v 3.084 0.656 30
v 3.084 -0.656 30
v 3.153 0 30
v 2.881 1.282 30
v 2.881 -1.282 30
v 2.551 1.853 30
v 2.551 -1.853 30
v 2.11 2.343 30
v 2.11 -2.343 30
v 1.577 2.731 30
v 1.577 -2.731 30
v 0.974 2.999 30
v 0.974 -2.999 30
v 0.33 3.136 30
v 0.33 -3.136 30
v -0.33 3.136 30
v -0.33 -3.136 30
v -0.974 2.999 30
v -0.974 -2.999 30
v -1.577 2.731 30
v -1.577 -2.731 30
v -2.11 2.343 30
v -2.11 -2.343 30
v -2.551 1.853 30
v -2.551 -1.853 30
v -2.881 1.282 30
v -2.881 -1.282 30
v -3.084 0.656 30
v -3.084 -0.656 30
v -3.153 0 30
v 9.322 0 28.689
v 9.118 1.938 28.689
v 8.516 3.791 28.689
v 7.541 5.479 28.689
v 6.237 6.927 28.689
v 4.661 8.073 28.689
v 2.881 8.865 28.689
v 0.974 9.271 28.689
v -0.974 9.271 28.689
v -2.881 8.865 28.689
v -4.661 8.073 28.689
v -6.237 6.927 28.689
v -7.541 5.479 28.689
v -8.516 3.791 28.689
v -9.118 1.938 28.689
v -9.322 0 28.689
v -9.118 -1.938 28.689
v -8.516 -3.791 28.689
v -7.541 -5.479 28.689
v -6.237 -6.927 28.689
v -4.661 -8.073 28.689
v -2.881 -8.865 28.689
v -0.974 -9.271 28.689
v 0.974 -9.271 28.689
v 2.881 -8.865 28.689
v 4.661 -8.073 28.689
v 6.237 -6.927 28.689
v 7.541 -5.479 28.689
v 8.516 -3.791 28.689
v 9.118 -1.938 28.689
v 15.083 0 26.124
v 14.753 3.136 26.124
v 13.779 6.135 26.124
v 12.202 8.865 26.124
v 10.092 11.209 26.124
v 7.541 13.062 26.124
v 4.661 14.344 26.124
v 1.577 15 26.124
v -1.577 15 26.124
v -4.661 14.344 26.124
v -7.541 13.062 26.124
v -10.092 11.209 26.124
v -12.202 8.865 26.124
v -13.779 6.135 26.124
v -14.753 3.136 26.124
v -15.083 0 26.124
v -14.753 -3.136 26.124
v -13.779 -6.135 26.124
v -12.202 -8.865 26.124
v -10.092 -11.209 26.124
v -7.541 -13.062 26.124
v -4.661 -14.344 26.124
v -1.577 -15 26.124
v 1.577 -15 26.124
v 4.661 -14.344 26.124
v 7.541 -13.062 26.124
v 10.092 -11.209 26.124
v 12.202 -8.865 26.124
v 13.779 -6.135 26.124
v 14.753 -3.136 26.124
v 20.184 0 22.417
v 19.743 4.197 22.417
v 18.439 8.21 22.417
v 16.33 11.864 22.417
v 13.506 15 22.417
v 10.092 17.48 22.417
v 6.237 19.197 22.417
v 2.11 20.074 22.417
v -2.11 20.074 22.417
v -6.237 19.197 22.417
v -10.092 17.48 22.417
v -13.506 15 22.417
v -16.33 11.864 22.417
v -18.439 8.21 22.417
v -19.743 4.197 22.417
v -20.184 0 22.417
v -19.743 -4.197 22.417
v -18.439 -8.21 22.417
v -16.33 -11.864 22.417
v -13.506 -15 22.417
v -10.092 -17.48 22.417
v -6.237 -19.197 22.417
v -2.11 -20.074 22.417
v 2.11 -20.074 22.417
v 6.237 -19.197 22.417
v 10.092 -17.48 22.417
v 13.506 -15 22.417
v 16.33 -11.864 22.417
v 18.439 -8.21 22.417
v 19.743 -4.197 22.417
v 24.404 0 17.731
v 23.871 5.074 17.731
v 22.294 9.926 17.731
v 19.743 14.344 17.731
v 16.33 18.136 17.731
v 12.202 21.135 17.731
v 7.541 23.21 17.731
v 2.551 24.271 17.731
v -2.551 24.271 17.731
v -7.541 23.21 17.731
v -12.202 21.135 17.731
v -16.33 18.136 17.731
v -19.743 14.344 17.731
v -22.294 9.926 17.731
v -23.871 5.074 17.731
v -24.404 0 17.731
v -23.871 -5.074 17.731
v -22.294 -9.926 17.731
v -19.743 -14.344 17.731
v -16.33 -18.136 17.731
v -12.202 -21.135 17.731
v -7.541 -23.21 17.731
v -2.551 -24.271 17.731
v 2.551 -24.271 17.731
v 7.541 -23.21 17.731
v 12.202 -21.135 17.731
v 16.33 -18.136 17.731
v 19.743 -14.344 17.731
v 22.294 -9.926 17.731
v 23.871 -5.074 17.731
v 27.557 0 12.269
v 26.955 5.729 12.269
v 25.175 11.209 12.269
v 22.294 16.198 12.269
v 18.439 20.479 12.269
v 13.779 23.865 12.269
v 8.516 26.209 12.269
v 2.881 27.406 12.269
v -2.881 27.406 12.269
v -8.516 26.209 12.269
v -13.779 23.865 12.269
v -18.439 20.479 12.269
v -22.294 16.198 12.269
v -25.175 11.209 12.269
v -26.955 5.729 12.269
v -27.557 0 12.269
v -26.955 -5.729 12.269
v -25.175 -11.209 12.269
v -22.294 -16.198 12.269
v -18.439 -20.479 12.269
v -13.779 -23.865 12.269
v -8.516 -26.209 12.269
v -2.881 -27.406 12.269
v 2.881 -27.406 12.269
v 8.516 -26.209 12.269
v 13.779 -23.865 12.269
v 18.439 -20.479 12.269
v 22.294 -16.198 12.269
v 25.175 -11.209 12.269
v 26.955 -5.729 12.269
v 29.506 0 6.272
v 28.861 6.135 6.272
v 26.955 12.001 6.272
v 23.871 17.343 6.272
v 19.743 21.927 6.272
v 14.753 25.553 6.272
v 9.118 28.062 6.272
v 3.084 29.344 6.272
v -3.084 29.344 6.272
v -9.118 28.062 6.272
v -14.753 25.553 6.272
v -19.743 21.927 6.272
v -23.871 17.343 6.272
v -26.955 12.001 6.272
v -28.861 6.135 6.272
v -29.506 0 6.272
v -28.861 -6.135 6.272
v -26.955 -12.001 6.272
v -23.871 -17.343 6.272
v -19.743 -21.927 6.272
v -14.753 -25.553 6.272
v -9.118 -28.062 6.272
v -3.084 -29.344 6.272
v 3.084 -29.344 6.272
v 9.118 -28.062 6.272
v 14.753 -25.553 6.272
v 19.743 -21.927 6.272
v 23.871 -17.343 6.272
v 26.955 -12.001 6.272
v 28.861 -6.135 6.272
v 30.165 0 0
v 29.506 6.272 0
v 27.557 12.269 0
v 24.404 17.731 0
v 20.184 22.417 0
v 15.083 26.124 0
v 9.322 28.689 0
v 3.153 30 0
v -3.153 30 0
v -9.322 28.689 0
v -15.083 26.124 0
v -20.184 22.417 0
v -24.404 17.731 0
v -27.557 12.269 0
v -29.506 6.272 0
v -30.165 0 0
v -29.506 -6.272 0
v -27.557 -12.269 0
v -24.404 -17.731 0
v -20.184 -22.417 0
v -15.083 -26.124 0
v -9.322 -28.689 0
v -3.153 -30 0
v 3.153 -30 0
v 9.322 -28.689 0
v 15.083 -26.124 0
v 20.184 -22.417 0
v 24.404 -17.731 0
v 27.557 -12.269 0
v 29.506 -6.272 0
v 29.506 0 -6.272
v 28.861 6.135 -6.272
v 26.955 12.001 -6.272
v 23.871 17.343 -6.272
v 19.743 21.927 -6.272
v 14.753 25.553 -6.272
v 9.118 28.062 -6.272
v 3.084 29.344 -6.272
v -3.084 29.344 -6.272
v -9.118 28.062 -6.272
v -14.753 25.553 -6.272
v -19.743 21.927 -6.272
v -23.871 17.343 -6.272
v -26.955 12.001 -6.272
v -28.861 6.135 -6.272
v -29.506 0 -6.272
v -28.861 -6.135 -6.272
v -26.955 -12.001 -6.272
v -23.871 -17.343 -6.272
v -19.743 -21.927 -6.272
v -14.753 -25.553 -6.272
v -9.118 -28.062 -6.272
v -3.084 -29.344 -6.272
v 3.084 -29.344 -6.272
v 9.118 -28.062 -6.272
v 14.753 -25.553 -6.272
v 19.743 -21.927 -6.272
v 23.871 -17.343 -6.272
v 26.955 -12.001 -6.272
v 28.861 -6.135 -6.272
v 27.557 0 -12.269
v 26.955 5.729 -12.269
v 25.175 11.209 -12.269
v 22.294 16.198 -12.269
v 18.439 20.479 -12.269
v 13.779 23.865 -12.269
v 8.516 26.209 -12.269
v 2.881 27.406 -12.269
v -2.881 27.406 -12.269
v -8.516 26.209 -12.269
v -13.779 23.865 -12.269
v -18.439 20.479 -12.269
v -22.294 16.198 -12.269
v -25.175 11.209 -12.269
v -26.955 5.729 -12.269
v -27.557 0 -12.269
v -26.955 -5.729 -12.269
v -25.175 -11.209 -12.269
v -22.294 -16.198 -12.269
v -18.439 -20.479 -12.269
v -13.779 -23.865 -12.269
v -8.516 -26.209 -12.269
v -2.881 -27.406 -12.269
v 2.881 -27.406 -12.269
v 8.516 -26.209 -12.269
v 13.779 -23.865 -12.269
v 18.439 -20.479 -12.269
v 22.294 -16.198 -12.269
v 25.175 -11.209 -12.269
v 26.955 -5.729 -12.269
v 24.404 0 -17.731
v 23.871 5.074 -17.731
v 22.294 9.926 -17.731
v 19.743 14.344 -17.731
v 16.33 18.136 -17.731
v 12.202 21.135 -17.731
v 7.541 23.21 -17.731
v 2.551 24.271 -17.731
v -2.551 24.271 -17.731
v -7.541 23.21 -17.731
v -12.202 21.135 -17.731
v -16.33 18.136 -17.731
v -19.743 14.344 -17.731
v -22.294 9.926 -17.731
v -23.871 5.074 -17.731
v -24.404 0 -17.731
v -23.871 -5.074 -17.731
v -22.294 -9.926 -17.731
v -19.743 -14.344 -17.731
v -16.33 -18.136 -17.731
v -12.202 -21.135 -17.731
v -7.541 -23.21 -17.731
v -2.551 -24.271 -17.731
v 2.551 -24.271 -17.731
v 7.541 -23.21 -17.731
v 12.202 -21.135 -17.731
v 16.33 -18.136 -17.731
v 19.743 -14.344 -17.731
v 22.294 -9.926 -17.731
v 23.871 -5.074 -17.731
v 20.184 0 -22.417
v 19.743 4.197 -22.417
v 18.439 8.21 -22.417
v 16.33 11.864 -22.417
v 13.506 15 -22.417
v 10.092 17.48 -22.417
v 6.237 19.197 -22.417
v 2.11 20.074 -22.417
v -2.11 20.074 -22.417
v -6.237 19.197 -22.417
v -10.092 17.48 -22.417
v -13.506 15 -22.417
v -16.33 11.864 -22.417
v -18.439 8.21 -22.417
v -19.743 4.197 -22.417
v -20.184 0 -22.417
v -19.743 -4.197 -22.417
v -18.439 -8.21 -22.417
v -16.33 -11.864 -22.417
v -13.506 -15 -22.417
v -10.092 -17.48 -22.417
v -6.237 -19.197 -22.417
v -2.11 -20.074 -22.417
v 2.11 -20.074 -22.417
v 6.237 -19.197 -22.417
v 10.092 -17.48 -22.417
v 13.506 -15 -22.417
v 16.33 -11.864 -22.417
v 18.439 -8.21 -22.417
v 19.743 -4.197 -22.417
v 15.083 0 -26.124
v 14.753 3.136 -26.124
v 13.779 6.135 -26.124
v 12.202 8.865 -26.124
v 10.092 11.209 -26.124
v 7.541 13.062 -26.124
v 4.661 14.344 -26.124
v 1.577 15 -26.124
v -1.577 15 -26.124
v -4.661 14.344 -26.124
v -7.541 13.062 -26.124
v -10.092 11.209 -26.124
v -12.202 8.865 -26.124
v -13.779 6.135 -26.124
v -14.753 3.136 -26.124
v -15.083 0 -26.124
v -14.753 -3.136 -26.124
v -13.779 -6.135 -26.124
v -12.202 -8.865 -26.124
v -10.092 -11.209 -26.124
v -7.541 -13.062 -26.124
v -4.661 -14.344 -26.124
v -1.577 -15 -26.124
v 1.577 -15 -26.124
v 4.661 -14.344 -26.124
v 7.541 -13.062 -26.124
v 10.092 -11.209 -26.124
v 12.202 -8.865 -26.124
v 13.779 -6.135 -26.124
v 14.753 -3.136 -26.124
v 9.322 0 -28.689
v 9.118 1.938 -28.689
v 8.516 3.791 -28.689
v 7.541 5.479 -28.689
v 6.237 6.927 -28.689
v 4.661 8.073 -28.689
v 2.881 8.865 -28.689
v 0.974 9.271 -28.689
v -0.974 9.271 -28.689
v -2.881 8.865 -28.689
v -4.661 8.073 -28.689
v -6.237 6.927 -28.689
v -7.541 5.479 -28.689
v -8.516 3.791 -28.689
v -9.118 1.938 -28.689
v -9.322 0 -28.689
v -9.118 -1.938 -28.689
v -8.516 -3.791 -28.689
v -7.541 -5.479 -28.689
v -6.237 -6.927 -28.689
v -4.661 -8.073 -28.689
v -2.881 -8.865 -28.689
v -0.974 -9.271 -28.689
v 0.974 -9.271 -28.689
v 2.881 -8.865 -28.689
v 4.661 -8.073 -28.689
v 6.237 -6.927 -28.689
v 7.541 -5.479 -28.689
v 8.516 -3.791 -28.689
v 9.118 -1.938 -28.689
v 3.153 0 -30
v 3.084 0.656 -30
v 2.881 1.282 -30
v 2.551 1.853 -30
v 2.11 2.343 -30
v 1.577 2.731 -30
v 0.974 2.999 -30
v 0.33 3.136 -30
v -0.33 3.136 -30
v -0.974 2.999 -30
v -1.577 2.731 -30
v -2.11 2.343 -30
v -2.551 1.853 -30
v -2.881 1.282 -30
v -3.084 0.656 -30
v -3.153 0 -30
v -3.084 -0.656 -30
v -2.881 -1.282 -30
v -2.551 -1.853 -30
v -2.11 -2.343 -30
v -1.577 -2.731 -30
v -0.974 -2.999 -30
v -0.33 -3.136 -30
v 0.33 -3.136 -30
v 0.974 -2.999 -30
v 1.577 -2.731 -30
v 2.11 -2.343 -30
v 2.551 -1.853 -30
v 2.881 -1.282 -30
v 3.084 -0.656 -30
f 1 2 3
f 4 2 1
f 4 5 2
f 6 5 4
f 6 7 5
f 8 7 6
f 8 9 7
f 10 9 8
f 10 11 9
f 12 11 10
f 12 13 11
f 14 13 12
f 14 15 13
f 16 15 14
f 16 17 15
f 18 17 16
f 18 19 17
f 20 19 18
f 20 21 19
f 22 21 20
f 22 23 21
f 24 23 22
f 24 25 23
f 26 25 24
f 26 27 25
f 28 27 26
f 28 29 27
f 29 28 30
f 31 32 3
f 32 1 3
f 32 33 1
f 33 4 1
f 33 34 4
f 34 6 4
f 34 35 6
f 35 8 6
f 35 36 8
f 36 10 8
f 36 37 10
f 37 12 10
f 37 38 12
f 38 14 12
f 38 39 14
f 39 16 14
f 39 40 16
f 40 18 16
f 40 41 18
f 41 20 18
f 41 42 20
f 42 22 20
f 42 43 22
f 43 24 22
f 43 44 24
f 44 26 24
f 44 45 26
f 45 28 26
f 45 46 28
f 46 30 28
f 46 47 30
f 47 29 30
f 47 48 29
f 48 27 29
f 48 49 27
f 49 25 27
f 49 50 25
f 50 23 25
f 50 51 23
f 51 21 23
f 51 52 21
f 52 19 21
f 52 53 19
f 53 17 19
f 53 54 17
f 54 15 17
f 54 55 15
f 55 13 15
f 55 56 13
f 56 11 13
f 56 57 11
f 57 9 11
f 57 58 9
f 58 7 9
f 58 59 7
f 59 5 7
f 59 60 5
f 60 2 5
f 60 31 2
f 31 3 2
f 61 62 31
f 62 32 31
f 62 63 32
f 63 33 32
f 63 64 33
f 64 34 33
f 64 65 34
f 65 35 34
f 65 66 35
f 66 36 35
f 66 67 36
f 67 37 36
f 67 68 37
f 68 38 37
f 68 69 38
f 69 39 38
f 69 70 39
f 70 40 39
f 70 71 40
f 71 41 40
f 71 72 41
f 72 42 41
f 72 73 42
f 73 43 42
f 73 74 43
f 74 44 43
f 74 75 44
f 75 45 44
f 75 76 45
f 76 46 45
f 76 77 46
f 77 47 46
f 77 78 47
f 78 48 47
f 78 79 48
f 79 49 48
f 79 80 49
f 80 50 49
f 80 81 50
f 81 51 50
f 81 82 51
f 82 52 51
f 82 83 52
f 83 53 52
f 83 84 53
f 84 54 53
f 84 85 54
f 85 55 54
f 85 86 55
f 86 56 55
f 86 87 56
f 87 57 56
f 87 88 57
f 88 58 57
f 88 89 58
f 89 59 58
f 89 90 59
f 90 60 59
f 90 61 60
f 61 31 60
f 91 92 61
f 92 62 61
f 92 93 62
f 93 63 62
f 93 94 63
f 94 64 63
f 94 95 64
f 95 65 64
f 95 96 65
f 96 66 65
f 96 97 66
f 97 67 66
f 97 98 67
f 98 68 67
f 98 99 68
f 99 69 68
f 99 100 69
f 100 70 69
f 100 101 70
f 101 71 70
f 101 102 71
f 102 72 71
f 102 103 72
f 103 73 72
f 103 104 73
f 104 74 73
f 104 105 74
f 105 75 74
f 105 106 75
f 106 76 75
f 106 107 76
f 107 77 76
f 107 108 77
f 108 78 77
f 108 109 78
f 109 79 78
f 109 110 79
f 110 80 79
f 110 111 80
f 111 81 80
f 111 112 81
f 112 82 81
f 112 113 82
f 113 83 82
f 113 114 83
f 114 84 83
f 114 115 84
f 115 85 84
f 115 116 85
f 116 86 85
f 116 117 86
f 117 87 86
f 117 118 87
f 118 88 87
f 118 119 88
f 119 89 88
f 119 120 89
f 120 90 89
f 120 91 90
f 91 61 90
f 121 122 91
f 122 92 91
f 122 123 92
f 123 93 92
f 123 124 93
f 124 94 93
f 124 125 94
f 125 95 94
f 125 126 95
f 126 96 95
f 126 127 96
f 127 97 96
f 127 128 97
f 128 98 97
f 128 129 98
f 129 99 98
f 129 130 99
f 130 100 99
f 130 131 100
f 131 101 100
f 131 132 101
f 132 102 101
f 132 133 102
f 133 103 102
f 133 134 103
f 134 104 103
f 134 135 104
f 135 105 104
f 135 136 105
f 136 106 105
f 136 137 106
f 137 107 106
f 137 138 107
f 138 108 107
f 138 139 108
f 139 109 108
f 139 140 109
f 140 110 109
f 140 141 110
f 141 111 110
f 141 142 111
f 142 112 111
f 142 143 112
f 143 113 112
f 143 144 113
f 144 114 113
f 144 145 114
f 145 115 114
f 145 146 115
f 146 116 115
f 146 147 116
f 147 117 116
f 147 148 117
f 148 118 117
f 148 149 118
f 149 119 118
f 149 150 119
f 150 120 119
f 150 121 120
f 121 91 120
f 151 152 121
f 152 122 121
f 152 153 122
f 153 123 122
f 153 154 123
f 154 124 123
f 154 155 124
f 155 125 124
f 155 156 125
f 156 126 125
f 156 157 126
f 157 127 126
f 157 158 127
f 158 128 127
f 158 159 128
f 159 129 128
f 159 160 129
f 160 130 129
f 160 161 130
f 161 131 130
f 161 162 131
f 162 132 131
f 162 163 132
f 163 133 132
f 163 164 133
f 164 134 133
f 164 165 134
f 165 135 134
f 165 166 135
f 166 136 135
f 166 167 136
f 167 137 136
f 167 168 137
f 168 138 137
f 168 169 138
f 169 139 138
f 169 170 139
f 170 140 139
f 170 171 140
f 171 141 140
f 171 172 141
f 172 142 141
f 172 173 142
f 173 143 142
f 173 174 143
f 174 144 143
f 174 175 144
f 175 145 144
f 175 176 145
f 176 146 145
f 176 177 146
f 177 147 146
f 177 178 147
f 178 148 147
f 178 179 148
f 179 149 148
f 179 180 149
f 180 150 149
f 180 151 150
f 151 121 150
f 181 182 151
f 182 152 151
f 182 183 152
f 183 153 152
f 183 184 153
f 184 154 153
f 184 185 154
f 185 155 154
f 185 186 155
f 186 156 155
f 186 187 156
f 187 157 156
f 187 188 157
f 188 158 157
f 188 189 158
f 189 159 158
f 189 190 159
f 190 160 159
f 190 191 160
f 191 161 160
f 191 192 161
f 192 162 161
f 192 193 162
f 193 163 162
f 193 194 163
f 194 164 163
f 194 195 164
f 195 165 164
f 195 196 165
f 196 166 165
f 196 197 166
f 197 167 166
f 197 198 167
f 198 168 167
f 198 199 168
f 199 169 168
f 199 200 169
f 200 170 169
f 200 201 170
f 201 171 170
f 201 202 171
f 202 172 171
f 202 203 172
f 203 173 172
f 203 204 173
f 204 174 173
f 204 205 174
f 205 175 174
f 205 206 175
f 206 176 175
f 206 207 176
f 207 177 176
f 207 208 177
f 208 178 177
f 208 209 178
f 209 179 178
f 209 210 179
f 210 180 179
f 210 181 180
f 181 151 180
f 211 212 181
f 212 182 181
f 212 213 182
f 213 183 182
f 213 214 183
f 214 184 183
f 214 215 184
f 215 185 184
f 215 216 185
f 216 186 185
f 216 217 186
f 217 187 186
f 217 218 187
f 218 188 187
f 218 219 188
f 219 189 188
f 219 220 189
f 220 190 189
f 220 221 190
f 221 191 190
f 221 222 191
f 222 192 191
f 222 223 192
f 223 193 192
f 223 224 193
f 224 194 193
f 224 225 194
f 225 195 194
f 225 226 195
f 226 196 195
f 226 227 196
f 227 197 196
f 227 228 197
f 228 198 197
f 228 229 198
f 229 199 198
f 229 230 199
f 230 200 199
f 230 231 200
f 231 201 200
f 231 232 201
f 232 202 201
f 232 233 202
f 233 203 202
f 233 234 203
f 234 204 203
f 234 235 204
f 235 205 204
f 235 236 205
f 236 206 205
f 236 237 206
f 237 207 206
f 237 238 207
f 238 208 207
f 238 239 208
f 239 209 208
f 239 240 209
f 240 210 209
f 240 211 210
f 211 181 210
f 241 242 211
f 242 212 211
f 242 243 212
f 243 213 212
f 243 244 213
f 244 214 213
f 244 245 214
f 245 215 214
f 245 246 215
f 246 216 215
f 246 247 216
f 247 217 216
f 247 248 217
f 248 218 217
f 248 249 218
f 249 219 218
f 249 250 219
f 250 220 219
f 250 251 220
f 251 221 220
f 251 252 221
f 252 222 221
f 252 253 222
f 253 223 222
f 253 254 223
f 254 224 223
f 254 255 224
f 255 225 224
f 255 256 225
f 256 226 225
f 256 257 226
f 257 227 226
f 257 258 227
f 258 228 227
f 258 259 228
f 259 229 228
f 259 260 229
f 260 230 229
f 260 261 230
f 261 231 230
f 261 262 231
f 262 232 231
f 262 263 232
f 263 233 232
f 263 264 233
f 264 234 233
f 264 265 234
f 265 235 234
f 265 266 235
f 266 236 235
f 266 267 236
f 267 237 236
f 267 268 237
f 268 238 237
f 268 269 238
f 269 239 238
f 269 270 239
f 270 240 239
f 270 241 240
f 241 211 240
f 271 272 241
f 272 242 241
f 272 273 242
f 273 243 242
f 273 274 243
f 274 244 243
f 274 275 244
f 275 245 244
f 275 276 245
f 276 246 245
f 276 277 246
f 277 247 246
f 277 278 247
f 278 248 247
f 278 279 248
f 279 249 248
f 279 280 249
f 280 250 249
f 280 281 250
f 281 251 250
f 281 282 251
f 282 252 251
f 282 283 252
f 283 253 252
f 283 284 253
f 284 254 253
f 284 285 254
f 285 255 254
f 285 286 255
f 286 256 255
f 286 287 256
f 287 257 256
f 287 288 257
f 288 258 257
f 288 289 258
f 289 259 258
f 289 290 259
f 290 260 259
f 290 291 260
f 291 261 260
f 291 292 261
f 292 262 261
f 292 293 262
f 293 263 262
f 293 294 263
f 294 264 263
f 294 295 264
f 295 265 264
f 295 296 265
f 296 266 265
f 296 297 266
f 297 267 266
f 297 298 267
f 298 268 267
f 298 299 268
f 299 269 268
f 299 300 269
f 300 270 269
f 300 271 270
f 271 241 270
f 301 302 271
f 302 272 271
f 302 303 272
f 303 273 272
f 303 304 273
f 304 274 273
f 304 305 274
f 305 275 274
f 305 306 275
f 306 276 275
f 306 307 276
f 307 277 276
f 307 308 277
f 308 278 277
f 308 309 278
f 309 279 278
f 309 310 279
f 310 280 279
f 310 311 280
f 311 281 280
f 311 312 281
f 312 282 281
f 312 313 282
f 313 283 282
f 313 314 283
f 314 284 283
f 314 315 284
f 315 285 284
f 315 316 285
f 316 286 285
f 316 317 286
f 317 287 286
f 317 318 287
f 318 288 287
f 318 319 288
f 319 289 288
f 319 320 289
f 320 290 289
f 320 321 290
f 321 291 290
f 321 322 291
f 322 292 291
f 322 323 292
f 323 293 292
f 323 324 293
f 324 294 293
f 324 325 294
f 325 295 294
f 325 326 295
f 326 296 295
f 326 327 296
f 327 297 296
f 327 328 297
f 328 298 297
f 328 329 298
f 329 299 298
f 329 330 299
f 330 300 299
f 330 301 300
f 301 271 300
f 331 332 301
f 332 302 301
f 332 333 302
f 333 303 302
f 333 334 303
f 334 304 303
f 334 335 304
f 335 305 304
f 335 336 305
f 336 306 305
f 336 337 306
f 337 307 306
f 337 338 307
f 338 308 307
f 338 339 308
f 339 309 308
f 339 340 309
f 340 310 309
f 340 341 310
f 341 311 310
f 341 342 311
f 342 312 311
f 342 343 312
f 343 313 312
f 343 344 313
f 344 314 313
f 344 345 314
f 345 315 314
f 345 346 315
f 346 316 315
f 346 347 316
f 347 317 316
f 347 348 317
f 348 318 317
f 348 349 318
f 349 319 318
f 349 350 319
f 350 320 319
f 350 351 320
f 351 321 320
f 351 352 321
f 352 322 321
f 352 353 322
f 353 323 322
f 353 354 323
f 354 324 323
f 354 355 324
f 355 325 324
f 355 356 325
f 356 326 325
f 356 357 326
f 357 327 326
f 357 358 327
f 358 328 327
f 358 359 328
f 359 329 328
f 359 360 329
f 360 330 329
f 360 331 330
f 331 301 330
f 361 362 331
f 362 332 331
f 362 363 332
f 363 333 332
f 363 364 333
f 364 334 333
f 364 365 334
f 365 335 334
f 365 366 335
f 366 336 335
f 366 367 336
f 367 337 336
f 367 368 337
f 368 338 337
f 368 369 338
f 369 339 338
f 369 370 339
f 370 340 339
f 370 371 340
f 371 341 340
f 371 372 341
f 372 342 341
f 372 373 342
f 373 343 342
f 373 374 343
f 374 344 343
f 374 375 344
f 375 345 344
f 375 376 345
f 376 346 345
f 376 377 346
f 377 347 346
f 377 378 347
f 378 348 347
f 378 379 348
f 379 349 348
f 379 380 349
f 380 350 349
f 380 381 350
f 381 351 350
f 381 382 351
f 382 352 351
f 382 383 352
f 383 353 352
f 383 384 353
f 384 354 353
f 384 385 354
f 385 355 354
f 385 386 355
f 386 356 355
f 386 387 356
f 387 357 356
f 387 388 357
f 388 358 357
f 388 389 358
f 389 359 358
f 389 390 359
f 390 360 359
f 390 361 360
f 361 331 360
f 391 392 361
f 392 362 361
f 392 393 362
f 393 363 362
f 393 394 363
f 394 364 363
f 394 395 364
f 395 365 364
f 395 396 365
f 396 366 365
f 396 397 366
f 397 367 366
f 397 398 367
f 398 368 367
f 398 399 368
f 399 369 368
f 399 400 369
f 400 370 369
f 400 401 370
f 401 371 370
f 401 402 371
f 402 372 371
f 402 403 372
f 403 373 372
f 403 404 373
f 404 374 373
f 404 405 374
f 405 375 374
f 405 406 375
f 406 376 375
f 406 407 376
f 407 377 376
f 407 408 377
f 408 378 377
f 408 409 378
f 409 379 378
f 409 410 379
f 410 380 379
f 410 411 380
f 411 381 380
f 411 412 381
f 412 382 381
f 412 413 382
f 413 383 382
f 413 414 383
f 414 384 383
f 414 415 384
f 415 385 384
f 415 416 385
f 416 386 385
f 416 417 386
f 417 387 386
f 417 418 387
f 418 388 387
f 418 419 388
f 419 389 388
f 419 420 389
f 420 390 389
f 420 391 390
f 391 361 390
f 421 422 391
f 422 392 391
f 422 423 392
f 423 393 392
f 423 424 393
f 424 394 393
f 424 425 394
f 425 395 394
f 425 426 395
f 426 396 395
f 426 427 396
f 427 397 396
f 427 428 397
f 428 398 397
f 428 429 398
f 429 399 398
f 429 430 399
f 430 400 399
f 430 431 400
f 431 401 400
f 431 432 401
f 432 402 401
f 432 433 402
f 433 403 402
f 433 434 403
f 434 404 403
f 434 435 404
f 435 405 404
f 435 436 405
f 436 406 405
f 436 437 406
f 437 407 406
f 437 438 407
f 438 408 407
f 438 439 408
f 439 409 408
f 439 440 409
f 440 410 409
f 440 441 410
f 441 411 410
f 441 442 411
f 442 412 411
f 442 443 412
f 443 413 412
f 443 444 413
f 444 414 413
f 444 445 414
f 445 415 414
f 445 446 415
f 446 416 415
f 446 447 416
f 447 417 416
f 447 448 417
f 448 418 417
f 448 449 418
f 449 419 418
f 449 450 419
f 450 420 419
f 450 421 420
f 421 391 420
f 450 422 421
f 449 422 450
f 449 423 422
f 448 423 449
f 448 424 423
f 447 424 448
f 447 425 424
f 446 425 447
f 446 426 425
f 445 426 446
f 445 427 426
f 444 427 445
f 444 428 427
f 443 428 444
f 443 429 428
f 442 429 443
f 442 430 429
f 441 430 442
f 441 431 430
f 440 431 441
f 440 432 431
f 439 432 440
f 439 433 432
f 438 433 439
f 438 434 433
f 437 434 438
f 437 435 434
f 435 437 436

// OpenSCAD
// Unit of length: Unit.MM
resize(newsize = [0.0, 60.0, 0.0], auto = [true, false, true])
{
   sphere(r = 10.0);
}
